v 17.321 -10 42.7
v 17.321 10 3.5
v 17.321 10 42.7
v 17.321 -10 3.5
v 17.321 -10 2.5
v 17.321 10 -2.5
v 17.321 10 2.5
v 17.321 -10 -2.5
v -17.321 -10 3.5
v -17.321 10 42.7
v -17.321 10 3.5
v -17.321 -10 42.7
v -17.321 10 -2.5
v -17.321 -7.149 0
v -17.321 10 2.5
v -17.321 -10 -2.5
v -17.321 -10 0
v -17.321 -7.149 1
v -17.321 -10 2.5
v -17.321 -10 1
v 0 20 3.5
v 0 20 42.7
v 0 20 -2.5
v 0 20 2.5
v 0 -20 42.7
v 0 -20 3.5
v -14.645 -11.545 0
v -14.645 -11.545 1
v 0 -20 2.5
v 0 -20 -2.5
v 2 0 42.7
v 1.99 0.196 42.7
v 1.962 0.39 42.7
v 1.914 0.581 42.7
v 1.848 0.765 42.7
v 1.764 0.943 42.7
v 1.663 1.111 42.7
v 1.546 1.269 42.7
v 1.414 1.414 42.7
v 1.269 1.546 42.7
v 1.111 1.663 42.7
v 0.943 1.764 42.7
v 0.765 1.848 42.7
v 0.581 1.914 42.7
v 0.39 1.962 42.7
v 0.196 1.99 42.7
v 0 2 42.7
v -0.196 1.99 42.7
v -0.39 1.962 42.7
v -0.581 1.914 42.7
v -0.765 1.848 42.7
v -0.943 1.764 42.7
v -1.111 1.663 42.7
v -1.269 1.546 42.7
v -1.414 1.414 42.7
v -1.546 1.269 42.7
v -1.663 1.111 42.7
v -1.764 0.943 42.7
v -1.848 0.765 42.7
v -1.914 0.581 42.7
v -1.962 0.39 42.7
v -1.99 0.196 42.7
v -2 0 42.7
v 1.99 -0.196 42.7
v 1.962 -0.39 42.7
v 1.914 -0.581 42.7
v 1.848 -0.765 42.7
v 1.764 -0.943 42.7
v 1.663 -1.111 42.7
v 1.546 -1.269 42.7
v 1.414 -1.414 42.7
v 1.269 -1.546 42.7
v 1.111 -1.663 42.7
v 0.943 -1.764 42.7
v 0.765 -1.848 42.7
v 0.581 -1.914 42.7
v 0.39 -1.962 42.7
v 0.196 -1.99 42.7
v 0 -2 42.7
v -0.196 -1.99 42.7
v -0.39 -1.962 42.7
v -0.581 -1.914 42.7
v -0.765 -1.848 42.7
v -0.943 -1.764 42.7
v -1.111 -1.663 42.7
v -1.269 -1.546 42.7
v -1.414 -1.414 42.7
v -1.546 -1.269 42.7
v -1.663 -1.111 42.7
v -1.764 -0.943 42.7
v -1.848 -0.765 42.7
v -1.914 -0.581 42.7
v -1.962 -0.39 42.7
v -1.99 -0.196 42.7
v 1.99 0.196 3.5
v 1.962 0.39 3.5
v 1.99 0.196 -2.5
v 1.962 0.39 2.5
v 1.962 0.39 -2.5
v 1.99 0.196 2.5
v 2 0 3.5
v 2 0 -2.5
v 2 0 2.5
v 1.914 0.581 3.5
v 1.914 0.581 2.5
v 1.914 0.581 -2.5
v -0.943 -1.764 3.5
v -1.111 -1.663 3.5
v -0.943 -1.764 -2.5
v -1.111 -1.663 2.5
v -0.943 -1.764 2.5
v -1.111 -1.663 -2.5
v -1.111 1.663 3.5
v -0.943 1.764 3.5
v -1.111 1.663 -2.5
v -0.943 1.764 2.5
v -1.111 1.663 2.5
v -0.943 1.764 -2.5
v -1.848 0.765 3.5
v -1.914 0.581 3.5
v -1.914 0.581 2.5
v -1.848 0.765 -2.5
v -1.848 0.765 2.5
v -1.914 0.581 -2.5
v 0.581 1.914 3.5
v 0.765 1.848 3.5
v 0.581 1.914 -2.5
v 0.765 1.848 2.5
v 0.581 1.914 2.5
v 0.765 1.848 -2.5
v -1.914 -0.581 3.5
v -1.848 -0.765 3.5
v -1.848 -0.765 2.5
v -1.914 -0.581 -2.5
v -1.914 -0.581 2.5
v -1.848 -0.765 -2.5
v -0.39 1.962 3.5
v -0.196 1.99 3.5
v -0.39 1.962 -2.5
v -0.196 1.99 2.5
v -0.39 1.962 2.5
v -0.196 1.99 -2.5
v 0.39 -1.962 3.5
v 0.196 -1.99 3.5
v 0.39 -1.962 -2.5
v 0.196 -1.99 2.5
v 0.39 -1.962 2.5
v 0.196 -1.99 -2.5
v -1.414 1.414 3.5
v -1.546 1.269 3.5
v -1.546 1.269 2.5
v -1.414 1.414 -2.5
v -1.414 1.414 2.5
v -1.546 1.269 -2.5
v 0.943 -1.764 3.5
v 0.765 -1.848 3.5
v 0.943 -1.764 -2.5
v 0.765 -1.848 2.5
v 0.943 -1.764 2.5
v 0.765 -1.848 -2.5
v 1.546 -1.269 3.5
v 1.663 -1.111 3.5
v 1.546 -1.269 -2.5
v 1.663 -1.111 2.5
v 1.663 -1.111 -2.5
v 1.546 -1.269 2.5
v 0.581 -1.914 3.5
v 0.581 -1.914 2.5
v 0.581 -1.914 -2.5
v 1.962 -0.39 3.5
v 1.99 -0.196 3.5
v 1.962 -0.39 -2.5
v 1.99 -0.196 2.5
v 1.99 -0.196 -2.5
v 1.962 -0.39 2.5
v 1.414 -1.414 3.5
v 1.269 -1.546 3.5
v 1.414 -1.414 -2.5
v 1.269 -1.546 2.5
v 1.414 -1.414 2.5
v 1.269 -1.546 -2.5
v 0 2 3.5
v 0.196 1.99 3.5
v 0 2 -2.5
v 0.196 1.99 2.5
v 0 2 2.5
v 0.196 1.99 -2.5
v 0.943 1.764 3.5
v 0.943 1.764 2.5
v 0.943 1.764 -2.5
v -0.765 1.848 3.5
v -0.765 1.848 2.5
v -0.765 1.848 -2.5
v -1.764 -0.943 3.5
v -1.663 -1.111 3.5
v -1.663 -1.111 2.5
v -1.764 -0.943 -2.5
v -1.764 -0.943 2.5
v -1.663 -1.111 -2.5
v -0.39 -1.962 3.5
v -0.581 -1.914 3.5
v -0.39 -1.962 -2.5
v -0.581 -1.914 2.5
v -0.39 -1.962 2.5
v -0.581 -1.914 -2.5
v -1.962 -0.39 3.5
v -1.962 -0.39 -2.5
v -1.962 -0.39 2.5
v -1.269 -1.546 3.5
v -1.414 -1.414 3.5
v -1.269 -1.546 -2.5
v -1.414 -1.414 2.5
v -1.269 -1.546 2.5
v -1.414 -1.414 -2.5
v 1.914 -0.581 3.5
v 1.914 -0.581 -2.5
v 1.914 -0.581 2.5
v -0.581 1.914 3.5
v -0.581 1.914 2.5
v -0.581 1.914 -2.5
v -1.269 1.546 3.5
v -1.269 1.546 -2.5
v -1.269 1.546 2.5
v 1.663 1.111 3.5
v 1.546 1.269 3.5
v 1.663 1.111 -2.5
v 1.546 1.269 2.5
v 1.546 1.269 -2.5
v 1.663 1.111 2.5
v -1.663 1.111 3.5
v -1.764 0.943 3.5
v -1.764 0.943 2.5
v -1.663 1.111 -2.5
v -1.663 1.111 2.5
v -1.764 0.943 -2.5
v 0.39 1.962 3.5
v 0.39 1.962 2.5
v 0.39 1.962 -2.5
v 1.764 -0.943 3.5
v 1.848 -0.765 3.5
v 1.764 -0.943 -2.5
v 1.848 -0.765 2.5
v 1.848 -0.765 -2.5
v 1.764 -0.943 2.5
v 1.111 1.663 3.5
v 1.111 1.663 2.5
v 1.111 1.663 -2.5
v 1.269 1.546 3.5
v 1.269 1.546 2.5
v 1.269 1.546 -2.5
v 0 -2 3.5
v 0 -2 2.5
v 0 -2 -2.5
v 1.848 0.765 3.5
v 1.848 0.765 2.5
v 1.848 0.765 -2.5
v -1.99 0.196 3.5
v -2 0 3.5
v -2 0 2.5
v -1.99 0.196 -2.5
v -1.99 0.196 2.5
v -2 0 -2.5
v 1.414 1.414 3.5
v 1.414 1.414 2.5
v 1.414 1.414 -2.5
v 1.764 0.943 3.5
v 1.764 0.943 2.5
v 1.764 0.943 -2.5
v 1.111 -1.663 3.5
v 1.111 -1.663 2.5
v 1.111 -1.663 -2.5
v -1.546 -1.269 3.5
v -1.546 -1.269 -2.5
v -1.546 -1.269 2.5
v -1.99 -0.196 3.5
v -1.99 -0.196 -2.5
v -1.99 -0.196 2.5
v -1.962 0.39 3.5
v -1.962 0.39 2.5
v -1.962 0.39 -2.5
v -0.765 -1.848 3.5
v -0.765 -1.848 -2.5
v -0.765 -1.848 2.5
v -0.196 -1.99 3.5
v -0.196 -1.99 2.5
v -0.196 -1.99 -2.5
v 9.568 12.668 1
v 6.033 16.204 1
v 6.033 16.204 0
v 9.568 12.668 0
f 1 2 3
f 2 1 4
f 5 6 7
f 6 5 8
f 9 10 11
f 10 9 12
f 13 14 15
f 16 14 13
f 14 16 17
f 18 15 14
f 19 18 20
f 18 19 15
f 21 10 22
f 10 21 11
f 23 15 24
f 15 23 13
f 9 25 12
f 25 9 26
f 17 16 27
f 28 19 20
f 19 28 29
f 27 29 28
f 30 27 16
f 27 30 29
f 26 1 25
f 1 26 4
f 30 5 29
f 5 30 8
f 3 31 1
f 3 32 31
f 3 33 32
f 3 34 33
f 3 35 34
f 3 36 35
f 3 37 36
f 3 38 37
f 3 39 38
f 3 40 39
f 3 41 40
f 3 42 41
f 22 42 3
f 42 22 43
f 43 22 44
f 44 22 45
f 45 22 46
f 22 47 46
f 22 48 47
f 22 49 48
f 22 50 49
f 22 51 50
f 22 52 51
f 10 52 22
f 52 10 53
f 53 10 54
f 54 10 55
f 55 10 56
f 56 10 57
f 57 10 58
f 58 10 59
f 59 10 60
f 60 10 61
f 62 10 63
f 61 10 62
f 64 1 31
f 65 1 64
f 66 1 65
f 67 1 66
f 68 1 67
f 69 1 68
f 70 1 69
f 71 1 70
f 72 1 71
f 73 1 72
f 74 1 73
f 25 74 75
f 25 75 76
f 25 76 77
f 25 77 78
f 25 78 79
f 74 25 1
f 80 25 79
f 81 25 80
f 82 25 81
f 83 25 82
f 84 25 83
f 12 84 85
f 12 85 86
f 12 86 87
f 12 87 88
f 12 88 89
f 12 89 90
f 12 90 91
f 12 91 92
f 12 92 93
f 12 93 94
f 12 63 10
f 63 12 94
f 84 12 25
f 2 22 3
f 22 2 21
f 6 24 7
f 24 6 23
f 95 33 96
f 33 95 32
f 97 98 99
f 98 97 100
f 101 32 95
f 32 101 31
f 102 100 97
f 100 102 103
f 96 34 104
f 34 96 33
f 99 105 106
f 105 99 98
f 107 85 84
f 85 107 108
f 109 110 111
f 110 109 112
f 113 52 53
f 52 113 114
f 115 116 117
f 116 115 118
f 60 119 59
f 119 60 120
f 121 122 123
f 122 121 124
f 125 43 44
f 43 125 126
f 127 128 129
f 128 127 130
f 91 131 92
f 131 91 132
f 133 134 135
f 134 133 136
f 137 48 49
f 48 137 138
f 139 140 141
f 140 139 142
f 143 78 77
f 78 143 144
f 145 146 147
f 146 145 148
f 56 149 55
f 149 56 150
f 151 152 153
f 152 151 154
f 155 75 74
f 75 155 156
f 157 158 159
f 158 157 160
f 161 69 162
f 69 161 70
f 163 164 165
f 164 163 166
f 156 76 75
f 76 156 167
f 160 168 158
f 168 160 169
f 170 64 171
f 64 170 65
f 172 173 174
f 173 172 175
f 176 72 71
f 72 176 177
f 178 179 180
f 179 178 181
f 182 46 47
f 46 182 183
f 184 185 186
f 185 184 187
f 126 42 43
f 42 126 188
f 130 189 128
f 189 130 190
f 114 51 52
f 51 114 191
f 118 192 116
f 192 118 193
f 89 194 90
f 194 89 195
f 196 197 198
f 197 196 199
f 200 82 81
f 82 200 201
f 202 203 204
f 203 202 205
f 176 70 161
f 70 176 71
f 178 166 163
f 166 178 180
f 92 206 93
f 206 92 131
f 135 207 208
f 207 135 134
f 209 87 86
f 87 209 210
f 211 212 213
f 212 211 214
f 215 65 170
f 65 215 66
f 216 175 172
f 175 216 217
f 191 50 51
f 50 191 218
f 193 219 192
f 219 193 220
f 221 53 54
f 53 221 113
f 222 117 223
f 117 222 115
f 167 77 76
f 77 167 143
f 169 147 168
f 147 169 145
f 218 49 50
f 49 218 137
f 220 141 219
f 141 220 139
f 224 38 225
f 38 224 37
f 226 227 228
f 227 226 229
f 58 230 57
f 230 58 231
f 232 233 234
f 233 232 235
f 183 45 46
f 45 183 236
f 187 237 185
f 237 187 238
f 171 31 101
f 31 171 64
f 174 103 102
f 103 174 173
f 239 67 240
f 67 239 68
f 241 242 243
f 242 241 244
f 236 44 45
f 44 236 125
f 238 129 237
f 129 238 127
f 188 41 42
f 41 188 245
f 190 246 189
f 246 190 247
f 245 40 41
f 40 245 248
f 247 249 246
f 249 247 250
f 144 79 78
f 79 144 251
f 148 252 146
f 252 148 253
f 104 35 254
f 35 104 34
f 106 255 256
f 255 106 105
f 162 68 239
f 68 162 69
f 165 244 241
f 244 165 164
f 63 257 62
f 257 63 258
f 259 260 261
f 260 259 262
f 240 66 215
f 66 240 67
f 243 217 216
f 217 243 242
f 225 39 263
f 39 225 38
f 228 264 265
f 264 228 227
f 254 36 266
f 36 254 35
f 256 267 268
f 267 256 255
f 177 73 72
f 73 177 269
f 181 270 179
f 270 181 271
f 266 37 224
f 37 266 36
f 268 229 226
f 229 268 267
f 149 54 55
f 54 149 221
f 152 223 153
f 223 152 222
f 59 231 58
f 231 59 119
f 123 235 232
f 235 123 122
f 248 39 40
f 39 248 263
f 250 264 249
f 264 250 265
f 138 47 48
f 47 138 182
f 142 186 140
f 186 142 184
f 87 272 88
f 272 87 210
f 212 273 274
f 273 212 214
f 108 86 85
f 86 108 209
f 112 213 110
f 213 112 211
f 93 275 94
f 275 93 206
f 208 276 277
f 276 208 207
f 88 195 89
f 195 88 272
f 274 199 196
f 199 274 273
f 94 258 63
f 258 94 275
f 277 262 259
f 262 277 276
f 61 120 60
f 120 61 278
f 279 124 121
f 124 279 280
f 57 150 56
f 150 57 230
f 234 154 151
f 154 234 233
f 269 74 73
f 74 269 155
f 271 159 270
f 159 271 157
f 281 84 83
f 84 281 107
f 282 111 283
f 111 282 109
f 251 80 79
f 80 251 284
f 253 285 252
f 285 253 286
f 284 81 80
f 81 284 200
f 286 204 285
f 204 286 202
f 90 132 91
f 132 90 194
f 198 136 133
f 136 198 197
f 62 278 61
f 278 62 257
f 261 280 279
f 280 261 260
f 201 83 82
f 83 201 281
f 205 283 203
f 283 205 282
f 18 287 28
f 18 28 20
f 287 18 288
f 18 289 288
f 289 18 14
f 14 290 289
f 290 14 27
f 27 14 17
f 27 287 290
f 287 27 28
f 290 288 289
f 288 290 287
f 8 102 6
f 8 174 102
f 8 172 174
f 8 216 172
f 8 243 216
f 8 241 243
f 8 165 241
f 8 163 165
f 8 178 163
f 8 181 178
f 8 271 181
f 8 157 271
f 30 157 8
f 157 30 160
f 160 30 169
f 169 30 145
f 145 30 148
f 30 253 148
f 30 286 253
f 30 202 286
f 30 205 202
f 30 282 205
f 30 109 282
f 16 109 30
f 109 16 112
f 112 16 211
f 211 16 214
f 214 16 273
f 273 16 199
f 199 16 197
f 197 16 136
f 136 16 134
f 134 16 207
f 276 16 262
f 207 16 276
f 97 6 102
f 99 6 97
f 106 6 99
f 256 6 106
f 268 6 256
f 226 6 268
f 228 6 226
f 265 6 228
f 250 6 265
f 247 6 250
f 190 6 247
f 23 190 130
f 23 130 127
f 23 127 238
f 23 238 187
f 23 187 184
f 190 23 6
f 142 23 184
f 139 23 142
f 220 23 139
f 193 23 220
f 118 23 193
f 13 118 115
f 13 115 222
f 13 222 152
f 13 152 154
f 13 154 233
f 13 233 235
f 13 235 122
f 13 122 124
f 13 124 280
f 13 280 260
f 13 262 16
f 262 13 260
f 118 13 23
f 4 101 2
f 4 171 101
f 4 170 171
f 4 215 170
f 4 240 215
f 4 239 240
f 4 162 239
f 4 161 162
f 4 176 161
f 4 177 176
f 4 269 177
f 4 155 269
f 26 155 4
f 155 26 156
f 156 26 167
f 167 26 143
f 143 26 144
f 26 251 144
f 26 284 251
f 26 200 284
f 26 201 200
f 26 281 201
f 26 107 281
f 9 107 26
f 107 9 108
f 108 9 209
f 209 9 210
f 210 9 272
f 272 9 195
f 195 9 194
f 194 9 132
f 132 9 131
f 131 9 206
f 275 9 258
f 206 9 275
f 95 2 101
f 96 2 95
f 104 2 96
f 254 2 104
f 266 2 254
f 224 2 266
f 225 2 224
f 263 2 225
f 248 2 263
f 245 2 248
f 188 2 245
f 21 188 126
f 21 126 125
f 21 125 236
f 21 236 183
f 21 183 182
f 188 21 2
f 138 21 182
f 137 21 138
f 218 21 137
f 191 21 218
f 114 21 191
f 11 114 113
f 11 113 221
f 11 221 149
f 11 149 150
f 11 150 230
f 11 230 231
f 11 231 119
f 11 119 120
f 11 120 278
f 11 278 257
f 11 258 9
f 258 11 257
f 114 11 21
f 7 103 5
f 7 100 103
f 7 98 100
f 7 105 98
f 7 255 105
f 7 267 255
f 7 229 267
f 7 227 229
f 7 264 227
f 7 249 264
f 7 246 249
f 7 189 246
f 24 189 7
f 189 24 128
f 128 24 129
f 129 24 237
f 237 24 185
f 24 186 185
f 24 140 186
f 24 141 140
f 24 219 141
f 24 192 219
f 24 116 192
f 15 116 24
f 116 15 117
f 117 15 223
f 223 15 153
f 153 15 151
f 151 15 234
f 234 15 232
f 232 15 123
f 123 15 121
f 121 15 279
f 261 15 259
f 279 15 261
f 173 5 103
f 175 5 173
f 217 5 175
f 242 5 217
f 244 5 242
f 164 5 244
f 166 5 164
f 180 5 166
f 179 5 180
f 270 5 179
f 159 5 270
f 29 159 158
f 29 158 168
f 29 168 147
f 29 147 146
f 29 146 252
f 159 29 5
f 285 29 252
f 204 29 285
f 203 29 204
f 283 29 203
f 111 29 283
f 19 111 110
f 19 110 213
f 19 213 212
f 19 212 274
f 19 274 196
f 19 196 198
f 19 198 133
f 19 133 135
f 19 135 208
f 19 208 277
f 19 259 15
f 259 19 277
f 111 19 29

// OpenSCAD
module hex_prismatic_block() {
    difference() {
        // Hexagonal prism
        rotate([0, 0, 90])
        cylinder(h=46.2, r=20, $fn=6);
        
        // Circular through-hole
        translate([0, 0, -5])
        cylinder(h=60, r=2, $fn=64);
        
        // Diagonal recessed band/groove
        translate([-23.1, -20, 3.5])
        rotate([0, 0, 45])
        cube([46.2, 5, 1]);
        
        // End chamfers/steps
        translate([-23.1, -20, 0])
        cube([46.2, 40, 1]);
        translate([-23.1, -20, 6])
        cube([46.2, 40, 1]);
        
        // Notch-like relief
        translate([20, -20, 0])
        cube([6.2, 40, 7]);
    }
}

translate([0, 0, -3.5])
hex_prismatic_block();
